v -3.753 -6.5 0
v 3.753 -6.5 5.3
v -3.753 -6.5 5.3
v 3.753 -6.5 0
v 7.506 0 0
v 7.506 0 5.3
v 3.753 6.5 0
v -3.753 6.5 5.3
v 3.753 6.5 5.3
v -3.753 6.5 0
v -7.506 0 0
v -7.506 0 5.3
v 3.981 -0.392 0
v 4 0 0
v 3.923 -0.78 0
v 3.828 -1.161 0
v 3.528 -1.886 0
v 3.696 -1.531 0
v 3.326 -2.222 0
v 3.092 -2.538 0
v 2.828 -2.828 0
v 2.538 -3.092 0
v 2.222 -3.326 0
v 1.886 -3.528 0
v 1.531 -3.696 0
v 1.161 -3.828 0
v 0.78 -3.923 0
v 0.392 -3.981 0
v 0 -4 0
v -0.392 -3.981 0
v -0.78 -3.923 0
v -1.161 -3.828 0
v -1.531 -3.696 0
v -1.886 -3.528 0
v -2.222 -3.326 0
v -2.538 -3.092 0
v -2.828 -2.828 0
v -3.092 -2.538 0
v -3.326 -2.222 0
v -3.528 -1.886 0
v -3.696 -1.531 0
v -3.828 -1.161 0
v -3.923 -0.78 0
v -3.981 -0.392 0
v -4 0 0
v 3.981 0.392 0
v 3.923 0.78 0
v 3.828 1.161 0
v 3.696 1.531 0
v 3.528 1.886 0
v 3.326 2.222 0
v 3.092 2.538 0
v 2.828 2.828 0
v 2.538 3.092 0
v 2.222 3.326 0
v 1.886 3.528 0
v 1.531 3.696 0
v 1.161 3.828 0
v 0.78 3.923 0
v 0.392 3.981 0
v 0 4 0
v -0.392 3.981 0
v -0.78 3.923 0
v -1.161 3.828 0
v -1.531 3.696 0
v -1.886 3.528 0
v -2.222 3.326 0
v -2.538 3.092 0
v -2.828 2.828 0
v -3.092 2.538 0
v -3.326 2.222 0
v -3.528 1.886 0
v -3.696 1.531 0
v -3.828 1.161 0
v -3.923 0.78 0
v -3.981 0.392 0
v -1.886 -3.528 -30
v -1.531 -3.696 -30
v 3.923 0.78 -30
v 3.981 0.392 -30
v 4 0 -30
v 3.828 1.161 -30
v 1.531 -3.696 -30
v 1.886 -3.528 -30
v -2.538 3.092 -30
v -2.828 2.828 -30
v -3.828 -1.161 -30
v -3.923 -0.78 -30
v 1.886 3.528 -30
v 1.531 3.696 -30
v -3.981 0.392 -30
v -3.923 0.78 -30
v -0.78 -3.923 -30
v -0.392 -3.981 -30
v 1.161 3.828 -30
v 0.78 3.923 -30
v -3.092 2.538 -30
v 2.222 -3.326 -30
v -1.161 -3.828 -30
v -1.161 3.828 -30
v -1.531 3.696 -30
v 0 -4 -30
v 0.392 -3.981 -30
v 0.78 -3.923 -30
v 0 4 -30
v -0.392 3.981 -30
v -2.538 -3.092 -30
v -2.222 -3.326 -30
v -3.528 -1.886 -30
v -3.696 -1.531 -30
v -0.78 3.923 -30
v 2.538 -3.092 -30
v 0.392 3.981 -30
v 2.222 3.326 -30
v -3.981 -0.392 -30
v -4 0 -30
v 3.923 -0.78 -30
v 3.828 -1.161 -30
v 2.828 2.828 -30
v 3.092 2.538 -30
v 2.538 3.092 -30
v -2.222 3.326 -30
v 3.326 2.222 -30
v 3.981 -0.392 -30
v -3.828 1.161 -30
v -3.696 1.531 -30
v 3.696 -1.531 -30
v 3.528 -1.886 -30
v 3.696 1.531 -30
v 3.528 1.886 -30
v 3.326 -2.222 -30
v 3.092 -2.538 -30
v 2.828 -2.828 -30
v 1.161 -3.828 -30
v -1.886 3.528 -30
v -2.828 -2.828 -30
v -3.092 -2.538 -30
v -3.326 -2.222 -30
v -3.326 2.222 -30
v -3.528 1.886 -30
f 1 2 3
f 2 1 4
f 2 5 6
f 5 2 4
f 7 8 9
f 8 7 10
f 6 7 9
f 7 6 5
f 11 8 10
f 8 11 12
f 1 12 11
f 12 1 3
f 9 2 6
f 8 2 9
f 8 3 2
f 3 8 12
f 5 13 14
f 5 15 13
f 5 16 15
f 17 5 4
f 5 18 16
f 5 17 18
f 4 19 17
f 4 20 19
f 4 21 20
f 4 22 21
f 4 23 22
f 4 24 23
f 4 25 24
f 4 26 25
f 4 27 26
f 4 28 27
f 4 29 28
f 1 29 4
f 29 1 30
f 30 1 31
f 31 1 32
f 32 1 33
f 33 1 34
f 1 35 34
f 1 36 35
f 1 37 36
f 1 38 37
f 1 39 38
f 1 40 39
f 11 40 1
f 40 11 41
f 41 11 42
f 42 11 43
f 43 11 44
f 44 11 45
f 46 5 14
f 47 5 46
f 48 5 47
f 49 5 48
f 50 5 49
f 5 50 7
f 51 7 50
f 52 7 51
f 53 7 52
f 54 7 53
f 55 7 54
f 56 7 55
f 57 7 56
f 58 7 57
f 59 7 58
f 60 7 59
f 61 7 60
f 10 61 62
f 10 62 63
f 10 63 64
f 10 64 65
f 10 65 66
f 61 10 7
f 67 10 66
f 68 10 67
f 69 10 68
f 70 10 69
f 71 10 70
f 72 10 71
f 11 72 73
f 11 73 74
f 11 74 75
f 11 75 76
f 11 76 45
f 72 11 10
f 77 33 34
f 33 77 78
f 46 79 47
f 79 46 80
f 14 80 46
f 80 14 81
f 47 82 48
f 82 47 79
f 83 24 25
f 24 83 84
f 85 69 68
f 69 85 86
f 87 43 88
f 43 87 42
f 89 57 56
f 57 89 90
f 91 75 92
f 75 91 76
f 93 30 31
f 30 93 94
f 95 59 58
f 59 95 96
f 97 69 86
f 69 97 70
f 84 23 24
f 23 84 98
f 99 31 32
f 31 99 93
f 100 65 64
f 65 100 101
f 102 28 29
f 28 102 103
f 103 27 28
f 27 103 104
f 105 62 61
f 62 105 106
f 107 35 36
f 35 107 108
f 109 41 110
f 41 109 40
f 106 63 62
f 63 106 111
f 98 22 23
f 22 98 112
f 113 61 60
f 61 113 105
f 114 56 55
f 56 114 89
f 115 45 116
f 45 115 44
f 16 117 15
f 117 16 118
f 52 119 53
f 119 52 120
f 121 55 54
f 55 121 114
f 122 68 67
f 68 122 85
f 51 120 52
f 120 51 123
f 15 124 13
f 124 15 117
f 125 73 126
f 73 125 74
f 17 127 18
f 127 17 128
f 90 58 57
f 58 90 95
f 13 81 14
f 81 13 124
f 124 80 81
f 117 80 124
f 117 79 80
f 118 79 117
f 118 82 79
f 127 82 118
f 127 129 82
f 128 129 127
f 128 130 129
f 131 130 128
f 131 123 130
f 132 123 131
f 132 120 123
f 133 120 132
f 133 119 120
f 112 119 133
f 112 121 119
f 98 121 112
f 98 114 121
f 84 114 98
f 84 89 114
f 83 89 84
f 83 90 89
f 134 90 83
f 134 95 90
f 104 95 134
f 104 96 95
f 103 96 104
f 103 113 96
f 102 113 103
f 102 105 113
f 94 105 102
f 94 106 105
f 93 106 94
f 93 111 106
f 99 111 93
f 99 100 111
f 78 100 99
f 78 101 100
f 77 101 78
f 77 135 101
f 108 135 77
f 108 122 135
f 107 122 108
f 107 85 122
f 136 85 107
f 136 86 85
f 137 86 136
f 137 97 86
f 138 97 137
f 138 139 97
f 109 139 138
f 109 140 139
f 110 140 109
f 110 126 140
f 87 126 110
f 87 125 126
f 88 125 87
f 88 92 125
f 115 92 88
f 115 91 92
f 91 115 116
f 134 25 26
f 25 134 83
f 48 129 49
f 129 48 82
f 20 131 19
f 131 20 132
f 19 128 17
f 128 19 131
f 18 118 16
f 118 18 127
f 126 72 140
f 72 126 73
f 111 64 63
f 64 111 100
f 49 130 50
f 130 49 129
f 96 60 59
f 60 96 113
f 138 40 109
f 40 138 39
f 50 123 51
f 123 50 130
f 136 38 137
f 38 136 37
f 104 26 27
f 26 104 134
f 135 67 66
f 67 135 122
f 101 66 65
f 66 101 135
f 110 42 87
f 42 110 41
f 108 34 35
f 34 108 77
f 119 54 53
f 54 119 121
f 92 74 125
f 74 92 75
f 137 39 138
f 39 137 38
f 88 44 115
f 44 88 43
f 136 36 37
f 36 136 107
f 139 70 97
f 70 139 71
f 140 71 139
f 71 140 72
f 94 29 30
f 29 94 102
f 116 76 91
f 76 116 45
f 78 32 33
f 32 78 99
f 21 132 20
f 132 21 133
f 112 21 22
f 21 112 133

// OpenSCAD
// M8 hex bolt (ISO 4017 style, threads omitted)
// Head: hex prism, across-flats 13 mm, height 5.3 mm
// Shank: cylinder, d = 8 mm, length 30 mm
// Head bottom face at z = 0, shank extends toward -Z

$fn = 64;

af       = 13;      // across-flats of head
head_h   = 5.3;     // head height
shank_d  = 8;       // shank diameter
shank_l  = 30;      // shank length

module hex_prism(across_flats, h) {
    // circumscribed radius from across-flats distance
    cylinder(h = h, r = across_flats / sqrt(3), $fn = 6);
}

module m8_hex_bolt() {
    // head: sits on top of z = 0
    hex_prism(af, head_h);

    // shank: extends downward from z = 0
    translate([0, 0, -shank_l])
        cylinder(h = shank_l, d = shank_d);
}

m8_hex_bolt();
